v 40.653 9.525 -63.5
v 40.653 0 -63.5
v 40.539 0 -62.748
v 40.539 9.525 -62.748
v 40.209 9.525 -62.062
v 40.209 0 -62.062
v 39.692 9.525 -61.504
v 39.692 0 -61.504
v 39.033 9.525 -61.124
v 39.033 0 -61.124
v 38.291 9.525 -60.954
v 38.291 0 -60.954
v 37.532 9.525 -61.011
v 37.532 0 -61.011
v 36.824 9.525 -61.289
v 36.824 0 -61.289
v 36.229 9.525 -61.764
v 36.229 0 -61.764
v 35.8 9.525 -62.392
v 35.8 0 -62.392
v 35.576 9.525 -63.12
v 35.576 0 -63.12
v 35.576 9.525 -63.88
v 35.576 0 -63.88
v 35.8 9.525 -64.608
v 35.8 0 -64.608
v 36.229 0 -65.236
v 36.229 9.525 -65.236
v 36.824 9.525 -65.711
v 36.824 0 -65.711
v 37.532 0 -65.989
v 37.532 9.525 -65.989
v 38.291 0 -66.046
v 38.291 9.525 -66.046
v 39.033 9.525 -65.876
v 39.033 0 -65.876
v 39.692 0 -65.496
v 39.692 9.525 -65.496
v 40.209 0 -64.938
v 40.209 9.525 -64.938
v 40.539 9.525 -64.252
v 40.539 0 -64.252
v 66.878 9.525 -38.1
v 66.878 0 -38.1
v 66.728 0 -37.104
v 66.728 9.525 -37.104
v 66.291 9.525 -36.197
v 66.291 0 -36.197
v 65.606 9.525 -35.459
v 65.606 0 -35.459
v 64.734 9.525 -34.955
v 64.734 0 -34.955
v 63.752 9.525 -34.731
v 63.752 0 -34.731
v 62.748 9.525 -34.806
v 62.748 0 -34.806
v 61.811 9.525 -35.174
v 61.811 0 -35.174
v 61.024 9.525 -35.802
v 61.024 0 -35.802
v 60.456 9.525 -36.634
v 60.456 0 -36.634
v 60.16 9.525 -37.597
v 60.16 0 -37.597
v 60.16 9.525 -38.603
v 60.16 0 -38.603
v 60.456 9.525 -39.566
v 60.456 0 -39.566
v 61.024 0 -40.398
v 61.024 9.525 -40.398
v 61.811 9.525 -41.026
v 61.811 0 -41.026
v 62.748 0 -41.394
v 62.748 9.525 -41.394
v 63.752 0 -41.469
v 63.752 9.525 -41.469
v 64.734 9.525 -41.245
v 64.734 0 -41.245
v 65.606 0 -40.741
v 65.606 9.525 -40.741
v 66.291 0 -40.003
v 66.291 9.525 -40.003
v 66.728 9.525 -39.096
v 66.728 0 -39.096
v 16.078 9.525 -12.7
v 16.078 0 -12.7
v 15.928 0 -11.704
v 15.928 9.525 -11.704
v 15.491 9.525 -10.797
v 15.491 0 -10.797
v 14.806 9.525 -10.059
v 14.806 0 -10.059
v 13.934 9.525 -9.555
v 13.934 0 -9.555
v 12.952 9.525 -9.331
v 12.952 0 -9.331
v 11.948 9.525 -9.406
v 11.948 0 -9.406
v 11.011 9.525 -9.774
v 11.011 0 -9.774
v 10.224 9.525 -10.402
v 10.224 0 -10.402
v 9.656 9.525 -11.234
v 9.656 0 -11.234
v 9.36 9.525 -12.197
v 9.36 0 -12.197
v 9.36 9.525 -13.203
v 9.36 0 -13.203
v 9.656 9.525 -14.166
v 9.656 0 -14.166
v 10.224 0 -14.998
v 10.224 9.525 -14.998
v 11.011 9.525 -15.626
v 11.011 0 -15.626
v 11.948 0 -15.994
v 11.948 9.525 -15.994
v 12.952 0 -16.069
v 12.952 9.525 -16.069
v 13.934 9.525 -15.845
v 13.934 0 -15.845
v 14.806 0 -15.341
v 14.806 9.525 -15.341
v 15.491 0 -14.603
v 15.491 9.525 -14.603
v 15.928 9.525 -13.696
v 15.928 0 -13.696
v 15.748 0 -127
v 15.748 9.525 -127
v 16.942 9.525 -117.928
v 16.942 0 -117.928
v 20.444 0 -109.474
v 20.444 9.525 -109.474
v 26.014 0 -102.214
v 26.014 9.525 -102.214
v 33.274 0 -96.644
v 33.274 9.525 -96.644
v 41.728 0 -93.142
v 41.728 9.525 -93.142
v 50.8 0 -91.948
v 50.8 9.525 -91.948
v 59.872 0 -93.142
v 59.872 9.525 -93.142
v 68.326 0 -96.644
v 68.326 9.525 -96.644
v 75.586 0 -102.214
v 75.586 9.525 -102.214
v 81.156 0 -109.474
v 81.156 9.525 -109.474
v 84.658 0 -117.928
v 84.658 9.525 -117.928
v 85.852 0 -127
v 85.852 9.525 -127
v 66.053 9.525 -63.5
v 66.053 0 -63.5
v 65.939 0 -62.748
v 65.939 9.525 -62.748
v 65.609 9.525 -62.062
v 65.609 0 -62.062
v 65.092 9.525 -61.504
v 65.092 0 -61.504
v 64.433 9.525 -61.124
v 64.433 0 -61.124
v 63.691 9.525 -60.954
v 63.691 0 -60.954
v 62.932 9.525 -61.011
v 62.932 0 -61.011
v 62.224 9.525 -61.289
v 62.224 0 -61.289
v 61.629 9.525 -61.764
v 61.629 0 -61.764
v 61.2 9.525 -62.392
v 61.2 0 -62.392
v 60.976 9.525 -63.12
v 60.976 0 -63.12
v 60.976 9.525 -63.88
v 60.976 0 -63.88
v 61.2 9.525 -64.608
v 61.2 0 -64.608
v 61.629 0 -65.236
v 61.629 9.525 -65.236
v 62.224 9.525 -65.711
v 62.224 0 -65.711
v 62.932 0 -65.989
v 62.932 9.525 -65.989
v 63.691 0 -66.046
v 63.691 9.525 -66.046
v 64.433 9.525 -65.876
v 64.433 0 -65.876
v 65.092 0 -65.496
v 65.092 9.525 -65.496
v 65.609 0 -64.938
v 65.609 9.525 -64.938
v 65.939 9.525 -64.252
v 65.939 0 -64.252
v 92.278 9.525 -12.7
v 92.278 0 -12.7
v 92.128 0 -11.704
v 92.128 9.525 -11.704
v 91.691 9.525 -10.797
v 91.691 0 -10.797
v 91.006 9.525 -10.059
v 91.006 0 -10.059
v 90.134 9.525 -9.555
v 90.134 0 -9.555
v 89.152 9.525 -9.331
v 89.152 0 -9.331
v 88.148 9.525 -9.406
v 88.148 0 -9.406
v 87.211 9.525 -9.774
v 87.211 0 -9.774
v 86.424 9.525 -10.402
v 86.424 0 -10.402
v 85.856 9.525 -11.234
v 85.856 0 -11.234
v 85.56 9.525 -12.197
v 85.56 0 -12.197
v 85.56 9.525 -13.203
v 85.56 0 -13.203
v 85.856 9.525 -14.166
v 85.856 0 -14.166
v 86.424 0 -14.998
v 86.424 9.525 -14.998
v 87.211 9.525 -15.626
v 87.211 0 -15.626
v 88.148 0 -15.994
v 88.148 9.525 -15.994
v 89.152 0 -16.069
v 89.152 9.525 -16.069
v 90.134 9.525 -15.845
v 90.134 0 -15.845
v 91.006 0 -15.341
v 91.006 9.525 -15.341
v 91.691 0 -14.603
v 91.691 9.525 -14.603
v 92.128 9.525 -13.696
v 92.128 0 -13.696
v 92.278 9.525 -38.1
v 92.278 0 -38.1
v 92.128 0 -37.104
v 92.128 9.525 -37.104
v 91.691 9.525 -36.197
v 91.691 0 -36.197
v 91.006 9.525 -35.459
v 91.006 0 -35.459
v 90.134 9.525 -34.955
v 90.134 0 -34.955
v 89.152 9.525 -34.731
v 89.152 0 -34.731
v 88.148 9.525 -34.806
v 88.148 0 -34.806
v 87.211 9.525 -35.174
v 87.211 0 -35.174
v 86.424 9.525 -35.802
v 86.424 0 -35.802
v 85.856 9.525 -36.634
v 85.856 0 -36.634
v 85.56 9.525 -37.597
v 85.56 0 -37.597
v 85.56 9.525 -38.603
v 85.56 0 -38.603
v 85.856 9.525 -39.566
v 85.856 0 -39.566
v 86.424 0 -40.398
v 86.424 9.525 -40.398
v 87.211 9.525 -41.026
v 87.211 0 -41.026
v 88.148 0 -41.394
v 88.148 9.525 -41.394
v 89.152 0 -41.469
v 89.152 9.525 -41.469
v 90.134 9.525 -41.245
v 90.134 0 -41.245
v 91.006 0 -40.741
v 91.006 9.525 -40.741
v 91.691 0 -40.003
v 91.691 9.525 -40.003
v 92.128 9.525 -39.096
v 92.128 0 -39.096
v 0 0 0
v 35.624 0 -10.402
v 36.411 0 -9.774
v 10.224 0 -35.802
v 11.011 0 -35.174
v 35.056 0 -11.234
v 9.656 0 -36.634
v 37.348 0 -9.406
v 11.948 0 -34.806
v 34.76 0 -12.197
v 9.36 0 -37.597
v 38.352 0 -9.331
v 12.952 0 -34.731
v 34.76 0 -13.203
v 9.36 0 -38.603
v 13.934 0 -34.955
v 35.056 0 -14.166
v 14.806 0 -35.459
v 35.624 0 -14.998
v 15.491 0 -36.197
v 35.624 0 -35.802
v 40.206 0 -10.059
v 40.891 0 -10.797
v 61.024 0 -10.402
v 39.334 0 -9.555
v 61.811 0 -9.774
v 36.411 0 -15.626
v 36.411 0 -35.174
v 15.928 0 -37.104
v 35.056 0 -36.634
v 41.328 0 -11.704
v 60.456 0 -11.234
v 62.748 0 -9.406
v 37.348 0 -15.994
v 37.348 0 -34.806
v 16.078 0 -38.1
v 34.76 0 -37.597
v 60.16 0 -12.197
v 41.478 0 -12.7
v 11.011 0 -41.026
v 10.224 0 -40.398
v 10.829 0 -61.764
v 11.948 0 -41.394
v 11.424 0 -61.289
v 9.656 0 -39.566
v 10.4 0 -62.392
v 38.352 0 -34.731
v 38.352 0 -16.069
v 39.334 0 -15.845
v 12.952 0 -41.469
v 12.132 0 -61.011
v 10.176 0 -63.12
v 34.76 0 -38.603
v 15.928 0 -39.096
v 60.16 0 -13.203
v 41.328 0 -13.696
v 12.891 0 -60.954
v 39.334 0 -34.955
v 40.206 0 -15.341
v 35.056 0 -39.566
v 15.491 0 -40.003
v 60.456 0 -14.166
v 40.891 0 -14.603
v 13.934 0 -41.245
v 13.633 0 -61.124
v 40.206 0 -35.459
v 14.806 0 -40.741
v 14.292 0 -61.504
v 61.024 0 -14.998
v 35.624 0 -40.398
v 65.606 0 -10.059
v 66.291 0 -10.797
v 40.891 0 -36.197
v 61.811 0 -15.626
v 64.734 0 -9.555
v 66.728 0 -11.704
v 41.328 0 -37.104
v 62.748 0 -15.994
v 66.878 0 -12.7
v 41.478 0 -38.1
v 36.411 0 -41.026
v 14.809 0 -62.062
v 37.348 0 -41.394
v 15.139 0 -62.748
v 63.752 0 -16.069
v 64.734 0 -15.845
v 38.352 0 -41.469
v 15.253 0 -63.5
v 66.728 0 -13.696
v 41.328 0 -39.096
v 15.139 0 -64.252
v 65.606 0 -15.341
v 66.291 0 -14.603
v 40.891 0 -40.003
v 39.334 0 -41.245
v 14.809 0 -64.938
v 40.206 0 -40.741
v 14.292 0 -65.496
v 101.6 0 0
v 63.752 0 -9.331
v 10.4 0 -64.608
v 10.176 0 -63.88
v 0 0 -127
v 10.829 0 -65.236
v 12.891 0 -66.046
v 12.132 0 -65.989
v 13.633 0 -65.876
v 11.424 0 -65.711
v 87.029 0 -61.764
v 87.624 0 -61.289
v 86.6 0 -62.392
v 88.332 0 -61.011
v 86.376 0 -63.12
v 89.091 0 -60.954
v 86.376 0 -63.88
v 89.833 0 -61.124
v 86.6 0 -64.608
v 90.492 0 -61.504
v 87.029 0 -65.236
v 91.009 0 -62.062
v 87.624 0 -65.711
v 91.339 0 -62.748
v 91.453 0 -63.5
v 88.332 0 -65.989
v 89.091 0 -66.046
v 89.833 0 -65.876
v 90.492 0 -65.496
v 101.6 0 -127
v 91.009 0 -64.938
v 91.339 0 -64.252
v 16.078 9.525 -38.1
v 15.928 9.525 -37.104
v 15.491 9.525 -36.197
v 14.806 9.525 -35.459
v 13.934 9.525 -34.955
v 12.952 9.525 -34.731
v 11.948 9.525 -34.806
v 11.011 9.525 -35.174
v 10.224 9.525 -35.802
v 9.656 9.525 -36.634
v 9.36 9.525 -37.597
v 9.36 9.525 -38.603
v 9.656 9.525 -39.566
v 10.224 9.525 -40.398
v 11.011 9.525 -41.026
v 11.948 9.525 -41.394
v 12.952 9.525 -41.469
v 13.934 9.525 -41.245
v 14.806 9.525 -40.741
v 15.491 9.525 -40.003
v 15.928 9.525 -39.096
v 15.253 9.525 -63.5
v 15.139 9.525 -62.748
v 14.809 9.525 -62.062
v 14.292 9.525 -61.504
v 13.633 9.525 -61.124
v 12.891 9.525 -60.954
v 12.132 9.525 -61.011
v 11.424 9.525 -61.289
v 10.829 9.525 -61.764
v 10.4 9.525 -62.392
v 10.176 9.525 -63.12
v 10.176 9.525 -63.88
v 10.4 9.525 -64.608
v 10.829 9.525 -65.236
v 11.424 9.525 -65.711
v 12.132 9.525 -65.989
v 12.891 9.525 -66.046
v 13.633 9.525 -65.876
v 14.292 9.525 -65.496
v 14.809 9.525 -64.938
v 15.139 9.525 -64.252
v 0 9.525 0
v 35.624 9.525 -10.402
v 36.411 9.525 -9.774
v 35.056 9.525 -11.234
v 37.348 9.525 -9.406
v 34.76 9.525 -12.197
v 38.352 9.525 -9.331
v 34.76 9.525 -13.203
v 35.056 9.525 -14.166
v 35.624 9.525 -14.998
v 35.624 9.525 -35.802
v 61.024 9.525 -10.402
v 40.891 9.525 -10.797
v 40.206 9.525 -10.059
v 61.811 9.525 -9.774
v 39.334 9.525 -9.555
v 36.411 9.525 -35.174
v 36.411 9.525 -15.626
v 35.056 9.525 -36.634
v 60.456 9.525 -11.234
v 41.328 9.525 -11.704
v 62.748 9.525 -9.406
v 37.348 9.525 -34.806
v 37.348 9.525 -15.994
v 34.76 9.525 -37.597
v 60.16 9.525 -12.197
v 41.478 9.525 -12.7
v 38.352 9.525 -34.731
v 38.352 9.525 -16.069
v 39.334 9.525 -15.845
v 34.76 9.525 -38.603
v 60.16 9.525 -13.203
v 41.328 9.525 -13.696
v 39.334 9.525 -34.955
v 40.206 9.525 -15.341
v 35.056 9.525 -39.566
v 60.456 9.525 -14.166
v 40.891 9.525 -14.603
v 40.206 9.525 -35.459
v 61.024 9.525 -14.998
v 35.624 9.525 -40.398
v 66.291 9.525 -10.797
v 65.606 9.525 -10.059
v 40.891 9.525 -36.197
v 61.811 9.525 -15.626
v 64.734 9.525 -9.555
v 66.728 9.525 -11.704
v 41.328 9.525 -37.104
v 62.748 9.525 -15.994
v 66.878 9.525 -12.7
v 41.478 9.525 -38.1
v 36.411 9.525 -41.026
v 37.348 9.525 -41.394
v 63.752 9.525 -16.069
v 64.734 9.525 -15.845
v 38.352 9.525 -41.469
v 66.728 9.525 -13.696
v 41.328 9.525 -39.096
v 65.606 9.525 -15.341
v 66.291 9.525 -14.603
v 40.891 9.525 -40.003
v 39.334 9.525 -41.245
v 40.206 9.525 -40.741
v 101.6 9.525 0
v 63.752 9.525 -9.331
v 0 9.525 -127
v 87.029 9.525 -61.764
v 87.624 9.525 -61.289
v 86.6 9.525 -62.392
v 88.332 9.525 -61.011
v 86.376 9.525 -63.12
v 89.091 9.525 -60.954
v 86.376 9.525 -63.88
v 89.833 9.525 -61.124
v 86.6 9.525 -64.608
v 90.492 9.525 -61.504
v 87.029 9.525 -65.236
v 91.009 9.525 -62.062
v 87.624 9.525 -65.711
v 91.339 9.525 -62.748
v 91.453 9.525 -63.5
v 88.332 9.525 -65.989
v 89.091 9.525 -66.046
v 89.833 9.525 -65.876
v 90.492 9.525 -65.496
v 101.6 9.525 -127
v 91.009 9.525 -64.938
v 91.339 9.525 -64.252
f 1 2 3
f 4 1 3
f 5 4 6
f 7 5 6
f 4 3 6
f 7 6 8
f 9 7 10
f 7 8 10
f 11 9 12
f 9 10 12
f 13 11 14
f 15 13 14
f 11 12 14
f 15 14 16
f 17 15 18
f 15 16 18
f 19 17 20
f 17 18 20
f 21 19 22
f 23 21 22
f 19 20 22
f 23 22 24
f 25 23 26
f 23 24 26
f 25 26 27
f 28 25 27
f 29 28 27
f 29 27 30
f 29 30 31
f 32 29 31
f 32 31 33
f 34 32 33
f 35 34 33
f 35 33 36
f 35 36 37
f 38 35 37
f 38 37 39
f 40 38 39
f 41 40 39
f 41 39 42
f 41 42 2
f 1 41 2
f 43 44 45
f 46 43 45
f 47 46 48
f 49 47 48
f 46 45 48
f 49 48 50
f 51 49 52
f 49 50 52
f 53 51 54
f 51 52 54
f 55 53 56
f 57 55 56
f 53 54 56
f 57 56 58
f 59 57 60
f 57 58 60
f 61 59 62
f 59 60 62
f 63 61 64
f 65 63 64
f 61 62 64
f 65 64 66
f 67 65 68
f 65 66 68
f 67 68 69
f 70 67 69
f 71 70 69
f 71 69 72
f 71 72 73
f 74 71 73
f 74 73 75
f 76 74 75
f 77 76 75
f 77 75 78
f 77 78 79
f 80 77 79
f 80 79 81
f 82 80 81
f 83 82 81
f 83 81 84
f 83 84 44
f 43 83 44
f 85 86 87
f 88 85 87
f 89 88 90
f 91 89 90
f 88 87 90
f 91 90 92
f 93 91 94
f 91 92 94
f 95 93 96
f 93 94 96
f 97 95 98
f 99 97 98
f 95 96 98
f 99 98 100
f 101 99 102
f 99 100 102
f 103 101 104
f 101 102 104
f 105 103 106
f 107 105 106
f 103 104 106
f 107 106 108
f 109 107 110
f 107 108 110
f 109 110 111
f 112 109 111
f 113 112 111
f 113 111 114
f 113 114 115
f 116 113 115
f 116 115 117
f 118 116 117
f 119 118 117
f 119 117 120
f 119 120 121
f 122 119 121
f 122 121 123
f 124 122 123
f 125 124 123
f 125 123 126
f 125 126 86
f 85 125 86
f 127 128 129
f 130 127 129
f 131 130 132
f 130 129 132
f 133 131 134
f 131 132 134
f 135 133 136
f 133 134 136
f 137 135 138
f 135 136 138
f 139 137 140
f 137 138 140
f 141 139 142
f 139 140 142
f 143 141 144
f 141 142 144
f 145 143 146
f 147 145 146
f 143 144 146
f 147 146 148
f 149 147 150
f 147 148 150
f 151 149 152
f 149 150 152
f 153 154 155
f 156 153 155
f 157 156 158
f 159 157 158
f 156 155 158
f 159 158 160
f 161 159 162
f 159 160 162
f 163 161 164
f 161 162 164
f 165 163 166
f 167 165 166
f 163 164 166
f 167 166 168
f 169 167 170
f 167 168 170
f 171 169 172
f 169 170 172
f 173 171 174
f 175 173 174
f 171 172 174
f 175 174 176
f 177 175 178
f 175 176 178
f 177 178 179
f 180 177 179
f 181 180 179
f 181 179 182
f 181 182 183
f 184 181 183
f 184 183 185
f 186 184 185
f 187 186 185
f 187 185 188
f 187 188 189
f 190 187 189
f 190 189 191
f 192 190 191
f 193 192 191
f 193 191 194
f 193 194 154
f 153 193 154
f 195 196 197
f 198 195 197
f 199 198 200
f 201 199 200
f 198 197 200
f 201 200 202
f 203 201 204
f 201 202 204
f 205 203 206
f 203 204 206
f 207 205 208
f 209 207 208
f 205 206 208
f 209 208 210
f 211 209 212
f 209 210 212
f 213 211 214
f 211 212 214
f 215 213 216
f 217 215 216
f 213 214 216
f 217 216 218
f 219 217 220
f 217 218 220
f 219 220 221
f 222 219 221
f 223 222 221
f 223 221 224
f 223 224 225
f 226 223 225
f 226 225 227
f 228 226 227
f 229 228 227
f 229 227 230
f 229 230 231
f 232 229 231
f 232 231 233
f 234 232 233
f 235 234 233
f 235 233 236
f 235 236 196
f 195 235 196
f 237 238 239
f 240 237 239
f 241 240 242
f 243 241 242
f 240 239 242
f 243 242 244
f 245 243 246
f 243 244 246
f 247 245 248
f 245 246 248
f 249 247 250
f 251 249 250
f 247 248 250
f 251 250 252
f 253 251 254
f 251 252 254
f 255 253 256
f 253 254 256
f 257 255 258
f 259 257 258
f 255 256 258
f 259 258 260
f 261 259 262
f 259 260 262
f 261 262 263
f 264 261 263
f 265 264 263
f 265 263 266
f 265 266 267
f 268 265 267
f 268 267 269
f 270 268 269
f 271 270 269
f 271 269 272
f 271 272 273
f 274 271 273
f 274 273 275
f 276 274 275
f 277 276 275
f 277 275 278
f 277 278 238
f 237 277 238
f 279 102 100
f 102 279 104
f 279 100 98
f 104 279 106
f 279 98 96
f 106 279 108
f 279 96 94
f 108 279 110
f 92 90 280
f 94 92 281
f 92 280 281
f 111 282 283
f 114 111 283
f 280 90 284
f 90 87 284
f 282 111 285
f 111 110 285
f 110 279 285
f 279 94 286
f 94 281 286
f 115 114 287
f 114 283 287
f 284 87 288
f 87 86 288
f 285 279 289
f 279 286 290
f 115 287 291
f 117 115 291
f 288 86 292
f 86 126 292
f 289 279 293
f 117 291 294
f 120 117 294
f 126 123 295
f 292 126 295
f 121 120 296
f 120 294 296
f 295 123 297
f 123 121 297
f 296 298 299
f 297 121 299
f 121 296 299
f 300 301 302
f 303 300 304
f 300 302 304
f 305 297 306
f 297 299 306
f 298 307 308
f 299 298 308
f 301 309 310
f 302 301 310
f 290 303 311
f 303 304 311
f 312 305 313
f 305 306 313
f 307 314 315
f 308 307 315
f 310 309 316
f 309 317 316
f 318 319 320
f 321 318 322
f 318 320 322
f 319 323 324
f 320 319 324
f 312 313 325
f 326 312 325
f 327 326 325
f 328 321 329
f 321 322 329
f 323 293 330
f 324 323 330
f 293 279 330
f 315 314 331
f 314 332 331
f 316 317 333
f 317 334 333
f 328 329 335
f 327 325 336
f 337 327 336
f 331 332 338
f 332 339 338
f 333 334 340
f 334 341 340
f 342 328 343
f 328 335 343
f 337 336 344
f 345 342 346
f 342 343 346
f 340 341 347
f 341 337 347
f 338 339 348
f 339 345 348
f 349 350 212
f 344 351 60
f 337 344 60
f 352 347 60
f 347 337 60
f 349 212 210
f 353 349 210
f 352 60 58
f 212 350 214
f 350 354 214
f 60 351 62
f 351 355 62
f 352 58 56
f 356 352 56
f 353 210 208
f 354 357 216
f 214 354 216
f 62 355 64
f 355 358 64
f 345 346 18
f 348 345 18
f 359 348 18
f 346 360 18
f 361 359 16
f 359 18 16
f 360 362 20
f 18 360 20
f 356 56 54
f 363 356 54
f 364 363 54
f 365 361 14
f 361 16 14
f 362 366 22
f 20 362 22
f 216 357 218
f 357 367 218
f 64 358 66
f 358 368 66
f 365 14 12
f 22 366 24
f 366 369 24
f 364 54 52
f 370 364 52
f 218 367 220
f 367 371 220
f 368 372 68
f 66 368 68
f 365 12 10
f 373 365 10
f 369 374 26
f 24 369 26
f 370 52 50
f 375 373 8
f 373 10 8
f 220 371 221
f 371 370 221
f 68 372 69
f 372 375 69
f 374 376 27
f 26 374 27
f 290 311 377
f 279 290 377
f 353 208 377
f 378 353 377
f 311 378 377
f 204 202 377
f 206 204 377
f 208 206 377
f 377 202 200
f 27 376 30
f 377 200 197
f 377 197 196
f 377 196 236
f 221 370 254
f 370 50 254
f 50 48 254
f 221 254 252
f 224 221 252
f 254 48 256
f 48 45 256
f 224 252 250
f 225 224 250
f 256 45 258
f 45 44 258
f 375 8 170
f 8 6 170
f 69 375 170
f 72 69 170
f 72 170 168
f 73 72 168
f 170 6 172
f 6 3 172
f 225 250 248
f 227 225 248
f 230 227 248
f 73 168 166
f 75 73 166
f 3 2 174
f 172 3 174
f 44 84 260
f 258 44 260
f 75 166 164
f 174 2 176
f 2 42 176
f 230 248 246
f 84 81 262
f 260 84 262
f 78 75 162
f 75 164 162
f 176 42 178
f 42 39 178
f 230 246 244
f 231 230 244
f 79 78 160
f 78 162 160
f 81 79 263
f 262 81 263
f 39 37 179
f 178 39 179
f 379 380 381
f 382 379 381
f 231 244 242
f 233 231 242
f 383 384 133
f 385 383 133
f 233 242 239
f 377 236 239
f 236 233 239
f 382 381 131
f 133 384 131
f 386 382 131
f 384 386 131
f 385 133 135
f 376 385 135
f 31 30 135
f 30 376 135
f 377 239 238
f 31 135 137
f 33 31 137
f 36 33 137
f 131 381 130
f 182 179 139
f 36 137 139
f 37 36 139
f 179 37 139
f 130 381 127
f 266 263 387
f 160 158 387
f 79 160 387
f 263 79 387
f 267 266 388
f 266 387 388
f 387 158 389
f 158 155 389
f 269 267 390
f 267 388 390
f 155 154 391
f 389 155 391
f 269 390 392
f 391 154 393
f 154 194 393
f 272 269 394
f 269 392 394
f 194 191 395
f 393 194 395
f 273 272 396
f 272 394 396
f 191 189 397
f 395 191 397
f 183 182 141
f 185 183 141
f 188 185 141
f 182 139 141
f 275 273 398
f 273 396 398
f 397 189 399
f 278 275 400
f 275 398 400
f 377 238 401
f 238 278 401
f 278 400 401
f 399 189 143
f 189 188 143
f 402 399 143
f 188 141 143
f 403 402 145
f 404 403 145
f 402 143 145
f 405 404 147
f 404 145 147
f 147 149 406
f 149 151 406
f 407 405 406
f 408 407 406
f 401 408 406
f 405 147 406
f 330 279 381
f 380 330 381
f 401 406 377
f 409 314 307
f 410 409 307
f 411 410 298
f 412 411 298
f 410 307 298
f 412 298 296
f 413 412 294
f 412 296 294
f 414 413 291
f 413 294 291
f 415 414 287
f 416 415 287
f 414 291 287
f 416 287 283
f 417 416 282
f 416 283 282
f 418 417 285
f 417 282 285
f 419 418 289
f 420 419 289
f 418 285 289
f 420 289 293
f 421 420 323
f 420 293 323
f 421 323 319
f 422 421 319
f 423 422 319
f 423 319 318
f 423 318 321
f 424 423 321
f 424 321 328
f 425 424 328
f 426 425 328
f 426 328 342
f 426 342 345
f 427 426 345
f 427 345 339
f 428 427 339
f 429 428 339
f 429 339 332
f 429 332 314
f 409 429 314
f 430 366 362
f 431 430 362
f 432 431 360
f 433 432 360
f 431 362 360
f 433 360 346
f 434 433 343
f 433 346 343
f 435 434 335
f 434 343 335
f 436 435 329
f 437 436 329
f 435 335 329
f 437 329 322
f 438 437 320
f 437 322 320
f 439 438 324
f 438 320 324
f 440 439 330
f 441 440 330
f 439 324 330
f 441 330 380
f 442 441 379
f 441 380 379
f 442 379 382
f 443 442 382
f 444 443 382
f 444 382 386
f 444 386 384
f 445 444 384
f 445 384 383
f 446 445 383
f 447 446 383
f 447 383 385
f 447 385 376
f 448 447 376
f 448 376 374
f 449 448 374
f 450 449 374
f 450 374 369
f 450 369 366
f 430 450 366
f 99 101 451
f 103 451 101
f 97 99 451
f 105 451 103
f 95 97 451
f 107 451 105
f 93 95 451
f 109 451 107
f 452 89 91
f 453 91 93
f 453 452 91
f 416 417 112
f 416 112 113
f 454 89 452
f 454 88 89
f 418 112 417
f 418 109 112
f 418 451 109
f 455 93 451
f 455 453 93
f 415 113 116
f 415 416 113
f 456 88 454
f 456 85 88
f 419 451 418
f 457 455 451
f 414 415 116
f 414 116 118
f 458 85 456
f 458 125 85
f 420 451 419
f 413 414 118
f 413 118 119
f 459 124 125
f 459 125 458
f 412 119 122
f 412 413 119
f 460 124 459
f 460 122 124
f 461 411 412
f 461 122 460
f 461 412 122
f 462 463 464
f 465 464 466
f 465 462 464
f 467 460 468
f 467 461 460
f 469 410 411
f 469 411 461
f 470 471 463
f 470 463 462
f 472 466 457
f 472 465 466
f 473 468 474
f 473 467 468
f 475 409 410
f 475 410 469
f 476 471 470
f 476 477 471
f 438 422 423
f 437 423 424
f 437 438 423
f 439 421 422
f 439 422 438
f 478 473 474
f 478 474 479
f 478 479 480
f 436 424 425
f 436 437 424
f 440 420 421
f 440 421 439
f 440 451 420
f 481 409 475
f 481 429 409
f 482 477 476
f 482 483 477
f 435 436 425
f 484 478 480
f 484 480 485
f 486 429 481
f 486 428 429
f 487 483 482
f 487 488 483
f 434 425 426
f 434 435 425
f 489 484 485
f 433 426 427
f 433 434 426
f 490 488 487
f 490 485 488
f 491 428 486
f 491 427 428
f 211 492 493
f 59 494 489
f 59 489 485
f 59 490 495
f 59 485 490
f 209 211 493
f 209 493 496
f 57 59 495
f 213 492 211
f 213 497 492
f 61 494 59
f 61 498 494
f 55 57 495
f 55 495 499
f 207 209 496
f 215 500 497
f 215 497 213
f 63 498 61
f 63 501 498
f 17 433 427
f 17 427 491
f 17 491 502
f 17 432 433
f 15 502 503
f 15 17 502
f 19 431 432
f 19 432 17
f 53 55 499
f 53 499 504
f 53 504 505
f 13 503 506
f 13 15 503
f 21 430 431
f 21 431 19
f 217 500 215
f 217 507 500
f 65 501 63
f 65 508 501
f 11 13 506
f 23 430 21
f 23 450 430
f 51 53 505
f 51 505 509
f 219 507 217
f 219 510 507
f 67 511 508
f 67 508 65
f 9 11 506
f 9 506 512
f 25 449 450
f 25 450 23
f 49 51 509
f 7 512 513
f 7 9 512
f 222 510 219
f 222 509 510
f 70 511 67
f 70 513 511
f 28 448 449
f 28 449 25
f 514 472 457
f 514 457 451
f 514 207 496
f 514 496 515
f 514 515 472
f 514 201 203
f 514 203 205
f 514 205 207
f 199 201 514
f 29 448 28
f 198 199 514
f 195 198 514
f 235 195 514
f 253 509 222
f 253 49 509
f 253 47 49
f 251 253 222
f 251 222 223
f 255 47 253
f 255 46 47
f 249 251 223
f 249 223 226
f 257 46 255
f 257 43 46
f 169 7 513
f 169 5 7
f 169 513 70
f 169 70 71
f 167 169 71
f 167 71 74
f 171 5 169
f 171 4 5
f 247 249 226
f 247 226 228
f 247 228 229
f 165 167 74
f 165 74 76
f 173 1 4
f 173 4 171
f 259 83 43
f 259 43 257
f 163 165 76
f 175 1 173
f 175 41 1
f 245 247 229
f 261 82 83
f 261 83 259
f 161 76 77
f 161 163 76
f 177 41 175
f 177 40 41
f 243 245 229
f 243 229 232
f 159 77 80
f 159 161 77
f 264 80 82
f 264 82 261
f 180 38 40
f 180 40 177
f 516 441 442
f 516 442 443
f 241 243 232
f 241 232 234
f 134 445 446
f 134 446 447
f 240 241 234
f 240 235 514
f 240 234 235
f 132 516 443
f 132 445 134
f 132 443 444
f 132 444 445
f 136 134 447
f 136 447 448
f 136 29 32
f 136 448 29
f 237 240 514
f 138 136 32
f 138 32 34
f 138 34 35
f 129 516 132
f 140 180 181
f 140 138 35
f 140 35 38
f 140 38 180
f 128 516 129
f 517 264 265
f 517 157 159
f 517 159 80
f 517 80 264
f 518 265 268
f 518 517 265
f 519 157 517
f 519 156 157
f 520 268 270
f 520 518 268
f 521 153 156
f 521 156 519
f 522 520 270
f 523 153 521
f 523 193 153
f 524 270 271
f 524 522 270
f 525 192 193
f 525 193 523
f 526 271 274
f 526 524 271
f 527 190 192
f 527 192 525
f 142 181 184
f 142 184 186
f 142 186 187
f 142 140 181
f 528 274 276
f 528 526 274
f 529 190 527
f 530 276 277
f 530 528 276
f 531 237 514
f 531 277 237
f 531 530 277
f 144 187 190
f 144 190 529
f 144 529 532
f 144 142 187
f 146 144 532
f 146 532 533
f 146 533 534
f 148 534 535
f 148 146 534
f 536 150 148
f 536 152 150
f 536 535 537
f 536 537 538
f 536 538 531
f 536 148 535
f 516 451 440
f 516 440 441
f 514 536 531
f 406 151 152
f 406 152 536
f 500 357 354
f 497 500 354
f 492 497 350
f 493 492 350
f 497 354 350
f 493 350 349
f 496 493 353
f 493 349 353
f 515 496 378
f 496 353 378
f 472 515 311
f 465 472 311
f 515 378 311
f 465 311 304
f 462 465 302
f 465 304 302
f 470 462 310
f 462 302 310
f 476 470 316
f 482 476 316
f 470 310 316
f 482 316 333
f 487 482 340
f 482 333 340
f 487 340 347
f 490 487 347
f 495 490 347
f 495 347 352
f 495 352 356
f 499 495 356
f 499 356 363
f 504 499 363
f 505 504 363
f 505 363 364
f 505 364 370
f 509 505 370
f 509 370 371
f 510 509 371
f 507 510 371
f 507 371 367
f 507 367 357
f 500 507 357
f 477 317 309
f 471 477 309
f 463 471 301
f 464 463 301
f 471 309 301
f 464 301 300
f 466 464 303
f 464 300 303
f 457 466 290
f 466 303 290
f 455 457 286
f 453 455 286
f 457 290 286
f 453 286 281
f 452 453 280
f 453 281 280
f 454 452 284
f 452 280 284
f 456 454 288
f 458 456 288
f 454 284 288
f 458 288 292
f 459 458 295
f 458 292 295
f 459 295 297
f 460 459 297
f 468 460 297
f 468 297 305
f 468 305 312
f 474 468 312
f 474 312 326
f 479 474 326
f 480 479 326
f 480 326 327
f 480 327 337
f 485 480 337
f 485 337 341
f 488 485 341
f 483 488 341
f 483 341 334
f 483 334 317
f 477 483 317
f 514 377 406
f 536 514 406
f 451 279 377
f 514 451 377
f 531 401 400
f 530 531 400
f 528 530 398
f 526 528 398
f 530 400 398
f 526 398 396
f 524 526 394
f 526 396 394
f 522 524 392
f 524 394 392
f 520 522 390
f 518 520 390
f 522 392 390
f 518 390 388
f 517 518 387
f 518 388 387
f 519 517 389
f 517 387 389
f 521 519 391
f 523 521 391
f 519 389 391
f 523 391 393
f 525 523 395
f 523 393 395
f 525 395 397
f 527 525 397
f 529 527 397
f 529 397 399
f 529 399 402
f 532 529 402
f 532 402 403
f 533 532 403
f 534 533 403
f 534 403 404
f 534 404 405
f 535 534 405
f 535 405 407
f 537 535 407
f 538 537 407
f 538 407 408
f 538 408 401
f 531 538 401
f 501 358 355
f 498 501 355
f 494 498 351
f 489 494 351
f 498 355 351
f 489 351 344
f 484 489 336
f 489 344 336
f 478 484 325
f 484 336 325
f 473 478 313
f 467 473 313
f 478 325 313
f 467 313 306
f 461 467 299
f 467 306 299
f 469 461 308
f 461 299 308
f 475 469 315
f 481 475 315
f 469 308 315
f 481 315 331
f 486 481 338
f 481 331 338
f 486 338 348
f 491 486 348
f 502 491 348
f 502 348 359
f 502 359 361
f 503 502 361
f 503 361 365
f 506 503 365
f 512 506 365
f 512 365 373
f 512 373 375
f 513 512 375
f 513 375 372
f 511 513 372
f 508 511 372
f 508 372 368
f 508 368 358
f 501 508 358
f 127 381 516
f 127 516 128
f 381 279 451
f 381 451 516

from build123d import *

# Parameters (mm, degrees)
SKETCH1_W                   = 101.6
SKETCH1_H                   = 127
BOSS_EXTRUDE1_DEPTH         = 9.525
SKETCH2_R                   = 35.052
CUT_EXTRUDE1_DEPTH          = 10.525
F_1_4_CLEARANCE_HOLE1_D     = 6.7564
LPATTERN1_COUNT             = 2
LPATTERN1_PITCH             = 25.4
LPATTERN1_COUNT_DIR2        = 4
LPATTERN1_PITCH_DIR2        = 25.4
TAP_DRILL_FOR_1_4_20_TAP1_D = 5.1054
LPATTERN2_COUNT             = 4
LPATTERN2_PITCH             = 25.4


with BuildPart() as part:
    # Sketch1 → Boss-Extrude1 (new body)
    with BuildSketch(Plane(origin=(0, 0, 0), x_dir=(1, 0, 0), z_dir=(0, 1, 0))):
        with Locations((50.8, 63.5)):
            Rectangle(SKETCH1_W, SKETCH1_H)
    extrude(amount=BOSS_EXTRUDE1_DEPTH)

    # Sketch2 → Cut-Extrude1 (cut, through all)
    with BuildSketch(Plane(origin=(0, 9.525, 0), x_dir=(1, 0, 0), z_dir=(0, 1, 0))):
        with Locations((50.8, 127)):
            Circle(SKETCH2_R)
    extrude(amount=-CUT_EXTRUDE1_DEPTH, mode=Mode.SUBTRACT)

    # 1/4 Clearance Hole1 (through all)
    with Locations(Plane(origin=(0, 9.525, 0), x_dir=(-1, 0, 0), z_dir=(0, 1, 0))):
        with Locations((-12.7, -12.7)):
            f_1_4_clearance_hole1 = Hole(F_1_4_CLEARANCE_HOLE1_D / 2)

    # LPattern1: 1_4 Clearance Hole1 2 × 4
    with Locations(*[(j * LPATTERN1_PITCH_DIR2, 0, -i * LPATTERN1_PITCH) for i in range(LPATTERN1_COUNT) for j in range(LPATTERN1_COUNT_DIR2) if (i, j) != (0, 0)]):
        add(f_1_4_clearance_hole1, mode=Mode.SUBTRACT)

    # Tap Drill for 1/4-20 Tap1 (through all)
    with Locations(Plane(origin=(0, 9.525, 0), x_dir=(-1, 0, 0), z_dir=(0, 1, 0))):
        with Locations((-12.7, -63.5)):
            tap_drill_for_1_4_20_tap1 = Hole(TAP_DRILL_FOR_1_4_20_TAP1_D / 2)

    # LPattern2: Tap Drill for 1/4-20 Tap1 ×4
    with Locations(*[(i * LPATTERN2_PITCH, 0, 0) for i in range(1, LPATTERN2_COUNT)]):
        add(tap_drill_for_1_4_20_tap1, mode=Mode.SUBTRACT)


solid = part.part
